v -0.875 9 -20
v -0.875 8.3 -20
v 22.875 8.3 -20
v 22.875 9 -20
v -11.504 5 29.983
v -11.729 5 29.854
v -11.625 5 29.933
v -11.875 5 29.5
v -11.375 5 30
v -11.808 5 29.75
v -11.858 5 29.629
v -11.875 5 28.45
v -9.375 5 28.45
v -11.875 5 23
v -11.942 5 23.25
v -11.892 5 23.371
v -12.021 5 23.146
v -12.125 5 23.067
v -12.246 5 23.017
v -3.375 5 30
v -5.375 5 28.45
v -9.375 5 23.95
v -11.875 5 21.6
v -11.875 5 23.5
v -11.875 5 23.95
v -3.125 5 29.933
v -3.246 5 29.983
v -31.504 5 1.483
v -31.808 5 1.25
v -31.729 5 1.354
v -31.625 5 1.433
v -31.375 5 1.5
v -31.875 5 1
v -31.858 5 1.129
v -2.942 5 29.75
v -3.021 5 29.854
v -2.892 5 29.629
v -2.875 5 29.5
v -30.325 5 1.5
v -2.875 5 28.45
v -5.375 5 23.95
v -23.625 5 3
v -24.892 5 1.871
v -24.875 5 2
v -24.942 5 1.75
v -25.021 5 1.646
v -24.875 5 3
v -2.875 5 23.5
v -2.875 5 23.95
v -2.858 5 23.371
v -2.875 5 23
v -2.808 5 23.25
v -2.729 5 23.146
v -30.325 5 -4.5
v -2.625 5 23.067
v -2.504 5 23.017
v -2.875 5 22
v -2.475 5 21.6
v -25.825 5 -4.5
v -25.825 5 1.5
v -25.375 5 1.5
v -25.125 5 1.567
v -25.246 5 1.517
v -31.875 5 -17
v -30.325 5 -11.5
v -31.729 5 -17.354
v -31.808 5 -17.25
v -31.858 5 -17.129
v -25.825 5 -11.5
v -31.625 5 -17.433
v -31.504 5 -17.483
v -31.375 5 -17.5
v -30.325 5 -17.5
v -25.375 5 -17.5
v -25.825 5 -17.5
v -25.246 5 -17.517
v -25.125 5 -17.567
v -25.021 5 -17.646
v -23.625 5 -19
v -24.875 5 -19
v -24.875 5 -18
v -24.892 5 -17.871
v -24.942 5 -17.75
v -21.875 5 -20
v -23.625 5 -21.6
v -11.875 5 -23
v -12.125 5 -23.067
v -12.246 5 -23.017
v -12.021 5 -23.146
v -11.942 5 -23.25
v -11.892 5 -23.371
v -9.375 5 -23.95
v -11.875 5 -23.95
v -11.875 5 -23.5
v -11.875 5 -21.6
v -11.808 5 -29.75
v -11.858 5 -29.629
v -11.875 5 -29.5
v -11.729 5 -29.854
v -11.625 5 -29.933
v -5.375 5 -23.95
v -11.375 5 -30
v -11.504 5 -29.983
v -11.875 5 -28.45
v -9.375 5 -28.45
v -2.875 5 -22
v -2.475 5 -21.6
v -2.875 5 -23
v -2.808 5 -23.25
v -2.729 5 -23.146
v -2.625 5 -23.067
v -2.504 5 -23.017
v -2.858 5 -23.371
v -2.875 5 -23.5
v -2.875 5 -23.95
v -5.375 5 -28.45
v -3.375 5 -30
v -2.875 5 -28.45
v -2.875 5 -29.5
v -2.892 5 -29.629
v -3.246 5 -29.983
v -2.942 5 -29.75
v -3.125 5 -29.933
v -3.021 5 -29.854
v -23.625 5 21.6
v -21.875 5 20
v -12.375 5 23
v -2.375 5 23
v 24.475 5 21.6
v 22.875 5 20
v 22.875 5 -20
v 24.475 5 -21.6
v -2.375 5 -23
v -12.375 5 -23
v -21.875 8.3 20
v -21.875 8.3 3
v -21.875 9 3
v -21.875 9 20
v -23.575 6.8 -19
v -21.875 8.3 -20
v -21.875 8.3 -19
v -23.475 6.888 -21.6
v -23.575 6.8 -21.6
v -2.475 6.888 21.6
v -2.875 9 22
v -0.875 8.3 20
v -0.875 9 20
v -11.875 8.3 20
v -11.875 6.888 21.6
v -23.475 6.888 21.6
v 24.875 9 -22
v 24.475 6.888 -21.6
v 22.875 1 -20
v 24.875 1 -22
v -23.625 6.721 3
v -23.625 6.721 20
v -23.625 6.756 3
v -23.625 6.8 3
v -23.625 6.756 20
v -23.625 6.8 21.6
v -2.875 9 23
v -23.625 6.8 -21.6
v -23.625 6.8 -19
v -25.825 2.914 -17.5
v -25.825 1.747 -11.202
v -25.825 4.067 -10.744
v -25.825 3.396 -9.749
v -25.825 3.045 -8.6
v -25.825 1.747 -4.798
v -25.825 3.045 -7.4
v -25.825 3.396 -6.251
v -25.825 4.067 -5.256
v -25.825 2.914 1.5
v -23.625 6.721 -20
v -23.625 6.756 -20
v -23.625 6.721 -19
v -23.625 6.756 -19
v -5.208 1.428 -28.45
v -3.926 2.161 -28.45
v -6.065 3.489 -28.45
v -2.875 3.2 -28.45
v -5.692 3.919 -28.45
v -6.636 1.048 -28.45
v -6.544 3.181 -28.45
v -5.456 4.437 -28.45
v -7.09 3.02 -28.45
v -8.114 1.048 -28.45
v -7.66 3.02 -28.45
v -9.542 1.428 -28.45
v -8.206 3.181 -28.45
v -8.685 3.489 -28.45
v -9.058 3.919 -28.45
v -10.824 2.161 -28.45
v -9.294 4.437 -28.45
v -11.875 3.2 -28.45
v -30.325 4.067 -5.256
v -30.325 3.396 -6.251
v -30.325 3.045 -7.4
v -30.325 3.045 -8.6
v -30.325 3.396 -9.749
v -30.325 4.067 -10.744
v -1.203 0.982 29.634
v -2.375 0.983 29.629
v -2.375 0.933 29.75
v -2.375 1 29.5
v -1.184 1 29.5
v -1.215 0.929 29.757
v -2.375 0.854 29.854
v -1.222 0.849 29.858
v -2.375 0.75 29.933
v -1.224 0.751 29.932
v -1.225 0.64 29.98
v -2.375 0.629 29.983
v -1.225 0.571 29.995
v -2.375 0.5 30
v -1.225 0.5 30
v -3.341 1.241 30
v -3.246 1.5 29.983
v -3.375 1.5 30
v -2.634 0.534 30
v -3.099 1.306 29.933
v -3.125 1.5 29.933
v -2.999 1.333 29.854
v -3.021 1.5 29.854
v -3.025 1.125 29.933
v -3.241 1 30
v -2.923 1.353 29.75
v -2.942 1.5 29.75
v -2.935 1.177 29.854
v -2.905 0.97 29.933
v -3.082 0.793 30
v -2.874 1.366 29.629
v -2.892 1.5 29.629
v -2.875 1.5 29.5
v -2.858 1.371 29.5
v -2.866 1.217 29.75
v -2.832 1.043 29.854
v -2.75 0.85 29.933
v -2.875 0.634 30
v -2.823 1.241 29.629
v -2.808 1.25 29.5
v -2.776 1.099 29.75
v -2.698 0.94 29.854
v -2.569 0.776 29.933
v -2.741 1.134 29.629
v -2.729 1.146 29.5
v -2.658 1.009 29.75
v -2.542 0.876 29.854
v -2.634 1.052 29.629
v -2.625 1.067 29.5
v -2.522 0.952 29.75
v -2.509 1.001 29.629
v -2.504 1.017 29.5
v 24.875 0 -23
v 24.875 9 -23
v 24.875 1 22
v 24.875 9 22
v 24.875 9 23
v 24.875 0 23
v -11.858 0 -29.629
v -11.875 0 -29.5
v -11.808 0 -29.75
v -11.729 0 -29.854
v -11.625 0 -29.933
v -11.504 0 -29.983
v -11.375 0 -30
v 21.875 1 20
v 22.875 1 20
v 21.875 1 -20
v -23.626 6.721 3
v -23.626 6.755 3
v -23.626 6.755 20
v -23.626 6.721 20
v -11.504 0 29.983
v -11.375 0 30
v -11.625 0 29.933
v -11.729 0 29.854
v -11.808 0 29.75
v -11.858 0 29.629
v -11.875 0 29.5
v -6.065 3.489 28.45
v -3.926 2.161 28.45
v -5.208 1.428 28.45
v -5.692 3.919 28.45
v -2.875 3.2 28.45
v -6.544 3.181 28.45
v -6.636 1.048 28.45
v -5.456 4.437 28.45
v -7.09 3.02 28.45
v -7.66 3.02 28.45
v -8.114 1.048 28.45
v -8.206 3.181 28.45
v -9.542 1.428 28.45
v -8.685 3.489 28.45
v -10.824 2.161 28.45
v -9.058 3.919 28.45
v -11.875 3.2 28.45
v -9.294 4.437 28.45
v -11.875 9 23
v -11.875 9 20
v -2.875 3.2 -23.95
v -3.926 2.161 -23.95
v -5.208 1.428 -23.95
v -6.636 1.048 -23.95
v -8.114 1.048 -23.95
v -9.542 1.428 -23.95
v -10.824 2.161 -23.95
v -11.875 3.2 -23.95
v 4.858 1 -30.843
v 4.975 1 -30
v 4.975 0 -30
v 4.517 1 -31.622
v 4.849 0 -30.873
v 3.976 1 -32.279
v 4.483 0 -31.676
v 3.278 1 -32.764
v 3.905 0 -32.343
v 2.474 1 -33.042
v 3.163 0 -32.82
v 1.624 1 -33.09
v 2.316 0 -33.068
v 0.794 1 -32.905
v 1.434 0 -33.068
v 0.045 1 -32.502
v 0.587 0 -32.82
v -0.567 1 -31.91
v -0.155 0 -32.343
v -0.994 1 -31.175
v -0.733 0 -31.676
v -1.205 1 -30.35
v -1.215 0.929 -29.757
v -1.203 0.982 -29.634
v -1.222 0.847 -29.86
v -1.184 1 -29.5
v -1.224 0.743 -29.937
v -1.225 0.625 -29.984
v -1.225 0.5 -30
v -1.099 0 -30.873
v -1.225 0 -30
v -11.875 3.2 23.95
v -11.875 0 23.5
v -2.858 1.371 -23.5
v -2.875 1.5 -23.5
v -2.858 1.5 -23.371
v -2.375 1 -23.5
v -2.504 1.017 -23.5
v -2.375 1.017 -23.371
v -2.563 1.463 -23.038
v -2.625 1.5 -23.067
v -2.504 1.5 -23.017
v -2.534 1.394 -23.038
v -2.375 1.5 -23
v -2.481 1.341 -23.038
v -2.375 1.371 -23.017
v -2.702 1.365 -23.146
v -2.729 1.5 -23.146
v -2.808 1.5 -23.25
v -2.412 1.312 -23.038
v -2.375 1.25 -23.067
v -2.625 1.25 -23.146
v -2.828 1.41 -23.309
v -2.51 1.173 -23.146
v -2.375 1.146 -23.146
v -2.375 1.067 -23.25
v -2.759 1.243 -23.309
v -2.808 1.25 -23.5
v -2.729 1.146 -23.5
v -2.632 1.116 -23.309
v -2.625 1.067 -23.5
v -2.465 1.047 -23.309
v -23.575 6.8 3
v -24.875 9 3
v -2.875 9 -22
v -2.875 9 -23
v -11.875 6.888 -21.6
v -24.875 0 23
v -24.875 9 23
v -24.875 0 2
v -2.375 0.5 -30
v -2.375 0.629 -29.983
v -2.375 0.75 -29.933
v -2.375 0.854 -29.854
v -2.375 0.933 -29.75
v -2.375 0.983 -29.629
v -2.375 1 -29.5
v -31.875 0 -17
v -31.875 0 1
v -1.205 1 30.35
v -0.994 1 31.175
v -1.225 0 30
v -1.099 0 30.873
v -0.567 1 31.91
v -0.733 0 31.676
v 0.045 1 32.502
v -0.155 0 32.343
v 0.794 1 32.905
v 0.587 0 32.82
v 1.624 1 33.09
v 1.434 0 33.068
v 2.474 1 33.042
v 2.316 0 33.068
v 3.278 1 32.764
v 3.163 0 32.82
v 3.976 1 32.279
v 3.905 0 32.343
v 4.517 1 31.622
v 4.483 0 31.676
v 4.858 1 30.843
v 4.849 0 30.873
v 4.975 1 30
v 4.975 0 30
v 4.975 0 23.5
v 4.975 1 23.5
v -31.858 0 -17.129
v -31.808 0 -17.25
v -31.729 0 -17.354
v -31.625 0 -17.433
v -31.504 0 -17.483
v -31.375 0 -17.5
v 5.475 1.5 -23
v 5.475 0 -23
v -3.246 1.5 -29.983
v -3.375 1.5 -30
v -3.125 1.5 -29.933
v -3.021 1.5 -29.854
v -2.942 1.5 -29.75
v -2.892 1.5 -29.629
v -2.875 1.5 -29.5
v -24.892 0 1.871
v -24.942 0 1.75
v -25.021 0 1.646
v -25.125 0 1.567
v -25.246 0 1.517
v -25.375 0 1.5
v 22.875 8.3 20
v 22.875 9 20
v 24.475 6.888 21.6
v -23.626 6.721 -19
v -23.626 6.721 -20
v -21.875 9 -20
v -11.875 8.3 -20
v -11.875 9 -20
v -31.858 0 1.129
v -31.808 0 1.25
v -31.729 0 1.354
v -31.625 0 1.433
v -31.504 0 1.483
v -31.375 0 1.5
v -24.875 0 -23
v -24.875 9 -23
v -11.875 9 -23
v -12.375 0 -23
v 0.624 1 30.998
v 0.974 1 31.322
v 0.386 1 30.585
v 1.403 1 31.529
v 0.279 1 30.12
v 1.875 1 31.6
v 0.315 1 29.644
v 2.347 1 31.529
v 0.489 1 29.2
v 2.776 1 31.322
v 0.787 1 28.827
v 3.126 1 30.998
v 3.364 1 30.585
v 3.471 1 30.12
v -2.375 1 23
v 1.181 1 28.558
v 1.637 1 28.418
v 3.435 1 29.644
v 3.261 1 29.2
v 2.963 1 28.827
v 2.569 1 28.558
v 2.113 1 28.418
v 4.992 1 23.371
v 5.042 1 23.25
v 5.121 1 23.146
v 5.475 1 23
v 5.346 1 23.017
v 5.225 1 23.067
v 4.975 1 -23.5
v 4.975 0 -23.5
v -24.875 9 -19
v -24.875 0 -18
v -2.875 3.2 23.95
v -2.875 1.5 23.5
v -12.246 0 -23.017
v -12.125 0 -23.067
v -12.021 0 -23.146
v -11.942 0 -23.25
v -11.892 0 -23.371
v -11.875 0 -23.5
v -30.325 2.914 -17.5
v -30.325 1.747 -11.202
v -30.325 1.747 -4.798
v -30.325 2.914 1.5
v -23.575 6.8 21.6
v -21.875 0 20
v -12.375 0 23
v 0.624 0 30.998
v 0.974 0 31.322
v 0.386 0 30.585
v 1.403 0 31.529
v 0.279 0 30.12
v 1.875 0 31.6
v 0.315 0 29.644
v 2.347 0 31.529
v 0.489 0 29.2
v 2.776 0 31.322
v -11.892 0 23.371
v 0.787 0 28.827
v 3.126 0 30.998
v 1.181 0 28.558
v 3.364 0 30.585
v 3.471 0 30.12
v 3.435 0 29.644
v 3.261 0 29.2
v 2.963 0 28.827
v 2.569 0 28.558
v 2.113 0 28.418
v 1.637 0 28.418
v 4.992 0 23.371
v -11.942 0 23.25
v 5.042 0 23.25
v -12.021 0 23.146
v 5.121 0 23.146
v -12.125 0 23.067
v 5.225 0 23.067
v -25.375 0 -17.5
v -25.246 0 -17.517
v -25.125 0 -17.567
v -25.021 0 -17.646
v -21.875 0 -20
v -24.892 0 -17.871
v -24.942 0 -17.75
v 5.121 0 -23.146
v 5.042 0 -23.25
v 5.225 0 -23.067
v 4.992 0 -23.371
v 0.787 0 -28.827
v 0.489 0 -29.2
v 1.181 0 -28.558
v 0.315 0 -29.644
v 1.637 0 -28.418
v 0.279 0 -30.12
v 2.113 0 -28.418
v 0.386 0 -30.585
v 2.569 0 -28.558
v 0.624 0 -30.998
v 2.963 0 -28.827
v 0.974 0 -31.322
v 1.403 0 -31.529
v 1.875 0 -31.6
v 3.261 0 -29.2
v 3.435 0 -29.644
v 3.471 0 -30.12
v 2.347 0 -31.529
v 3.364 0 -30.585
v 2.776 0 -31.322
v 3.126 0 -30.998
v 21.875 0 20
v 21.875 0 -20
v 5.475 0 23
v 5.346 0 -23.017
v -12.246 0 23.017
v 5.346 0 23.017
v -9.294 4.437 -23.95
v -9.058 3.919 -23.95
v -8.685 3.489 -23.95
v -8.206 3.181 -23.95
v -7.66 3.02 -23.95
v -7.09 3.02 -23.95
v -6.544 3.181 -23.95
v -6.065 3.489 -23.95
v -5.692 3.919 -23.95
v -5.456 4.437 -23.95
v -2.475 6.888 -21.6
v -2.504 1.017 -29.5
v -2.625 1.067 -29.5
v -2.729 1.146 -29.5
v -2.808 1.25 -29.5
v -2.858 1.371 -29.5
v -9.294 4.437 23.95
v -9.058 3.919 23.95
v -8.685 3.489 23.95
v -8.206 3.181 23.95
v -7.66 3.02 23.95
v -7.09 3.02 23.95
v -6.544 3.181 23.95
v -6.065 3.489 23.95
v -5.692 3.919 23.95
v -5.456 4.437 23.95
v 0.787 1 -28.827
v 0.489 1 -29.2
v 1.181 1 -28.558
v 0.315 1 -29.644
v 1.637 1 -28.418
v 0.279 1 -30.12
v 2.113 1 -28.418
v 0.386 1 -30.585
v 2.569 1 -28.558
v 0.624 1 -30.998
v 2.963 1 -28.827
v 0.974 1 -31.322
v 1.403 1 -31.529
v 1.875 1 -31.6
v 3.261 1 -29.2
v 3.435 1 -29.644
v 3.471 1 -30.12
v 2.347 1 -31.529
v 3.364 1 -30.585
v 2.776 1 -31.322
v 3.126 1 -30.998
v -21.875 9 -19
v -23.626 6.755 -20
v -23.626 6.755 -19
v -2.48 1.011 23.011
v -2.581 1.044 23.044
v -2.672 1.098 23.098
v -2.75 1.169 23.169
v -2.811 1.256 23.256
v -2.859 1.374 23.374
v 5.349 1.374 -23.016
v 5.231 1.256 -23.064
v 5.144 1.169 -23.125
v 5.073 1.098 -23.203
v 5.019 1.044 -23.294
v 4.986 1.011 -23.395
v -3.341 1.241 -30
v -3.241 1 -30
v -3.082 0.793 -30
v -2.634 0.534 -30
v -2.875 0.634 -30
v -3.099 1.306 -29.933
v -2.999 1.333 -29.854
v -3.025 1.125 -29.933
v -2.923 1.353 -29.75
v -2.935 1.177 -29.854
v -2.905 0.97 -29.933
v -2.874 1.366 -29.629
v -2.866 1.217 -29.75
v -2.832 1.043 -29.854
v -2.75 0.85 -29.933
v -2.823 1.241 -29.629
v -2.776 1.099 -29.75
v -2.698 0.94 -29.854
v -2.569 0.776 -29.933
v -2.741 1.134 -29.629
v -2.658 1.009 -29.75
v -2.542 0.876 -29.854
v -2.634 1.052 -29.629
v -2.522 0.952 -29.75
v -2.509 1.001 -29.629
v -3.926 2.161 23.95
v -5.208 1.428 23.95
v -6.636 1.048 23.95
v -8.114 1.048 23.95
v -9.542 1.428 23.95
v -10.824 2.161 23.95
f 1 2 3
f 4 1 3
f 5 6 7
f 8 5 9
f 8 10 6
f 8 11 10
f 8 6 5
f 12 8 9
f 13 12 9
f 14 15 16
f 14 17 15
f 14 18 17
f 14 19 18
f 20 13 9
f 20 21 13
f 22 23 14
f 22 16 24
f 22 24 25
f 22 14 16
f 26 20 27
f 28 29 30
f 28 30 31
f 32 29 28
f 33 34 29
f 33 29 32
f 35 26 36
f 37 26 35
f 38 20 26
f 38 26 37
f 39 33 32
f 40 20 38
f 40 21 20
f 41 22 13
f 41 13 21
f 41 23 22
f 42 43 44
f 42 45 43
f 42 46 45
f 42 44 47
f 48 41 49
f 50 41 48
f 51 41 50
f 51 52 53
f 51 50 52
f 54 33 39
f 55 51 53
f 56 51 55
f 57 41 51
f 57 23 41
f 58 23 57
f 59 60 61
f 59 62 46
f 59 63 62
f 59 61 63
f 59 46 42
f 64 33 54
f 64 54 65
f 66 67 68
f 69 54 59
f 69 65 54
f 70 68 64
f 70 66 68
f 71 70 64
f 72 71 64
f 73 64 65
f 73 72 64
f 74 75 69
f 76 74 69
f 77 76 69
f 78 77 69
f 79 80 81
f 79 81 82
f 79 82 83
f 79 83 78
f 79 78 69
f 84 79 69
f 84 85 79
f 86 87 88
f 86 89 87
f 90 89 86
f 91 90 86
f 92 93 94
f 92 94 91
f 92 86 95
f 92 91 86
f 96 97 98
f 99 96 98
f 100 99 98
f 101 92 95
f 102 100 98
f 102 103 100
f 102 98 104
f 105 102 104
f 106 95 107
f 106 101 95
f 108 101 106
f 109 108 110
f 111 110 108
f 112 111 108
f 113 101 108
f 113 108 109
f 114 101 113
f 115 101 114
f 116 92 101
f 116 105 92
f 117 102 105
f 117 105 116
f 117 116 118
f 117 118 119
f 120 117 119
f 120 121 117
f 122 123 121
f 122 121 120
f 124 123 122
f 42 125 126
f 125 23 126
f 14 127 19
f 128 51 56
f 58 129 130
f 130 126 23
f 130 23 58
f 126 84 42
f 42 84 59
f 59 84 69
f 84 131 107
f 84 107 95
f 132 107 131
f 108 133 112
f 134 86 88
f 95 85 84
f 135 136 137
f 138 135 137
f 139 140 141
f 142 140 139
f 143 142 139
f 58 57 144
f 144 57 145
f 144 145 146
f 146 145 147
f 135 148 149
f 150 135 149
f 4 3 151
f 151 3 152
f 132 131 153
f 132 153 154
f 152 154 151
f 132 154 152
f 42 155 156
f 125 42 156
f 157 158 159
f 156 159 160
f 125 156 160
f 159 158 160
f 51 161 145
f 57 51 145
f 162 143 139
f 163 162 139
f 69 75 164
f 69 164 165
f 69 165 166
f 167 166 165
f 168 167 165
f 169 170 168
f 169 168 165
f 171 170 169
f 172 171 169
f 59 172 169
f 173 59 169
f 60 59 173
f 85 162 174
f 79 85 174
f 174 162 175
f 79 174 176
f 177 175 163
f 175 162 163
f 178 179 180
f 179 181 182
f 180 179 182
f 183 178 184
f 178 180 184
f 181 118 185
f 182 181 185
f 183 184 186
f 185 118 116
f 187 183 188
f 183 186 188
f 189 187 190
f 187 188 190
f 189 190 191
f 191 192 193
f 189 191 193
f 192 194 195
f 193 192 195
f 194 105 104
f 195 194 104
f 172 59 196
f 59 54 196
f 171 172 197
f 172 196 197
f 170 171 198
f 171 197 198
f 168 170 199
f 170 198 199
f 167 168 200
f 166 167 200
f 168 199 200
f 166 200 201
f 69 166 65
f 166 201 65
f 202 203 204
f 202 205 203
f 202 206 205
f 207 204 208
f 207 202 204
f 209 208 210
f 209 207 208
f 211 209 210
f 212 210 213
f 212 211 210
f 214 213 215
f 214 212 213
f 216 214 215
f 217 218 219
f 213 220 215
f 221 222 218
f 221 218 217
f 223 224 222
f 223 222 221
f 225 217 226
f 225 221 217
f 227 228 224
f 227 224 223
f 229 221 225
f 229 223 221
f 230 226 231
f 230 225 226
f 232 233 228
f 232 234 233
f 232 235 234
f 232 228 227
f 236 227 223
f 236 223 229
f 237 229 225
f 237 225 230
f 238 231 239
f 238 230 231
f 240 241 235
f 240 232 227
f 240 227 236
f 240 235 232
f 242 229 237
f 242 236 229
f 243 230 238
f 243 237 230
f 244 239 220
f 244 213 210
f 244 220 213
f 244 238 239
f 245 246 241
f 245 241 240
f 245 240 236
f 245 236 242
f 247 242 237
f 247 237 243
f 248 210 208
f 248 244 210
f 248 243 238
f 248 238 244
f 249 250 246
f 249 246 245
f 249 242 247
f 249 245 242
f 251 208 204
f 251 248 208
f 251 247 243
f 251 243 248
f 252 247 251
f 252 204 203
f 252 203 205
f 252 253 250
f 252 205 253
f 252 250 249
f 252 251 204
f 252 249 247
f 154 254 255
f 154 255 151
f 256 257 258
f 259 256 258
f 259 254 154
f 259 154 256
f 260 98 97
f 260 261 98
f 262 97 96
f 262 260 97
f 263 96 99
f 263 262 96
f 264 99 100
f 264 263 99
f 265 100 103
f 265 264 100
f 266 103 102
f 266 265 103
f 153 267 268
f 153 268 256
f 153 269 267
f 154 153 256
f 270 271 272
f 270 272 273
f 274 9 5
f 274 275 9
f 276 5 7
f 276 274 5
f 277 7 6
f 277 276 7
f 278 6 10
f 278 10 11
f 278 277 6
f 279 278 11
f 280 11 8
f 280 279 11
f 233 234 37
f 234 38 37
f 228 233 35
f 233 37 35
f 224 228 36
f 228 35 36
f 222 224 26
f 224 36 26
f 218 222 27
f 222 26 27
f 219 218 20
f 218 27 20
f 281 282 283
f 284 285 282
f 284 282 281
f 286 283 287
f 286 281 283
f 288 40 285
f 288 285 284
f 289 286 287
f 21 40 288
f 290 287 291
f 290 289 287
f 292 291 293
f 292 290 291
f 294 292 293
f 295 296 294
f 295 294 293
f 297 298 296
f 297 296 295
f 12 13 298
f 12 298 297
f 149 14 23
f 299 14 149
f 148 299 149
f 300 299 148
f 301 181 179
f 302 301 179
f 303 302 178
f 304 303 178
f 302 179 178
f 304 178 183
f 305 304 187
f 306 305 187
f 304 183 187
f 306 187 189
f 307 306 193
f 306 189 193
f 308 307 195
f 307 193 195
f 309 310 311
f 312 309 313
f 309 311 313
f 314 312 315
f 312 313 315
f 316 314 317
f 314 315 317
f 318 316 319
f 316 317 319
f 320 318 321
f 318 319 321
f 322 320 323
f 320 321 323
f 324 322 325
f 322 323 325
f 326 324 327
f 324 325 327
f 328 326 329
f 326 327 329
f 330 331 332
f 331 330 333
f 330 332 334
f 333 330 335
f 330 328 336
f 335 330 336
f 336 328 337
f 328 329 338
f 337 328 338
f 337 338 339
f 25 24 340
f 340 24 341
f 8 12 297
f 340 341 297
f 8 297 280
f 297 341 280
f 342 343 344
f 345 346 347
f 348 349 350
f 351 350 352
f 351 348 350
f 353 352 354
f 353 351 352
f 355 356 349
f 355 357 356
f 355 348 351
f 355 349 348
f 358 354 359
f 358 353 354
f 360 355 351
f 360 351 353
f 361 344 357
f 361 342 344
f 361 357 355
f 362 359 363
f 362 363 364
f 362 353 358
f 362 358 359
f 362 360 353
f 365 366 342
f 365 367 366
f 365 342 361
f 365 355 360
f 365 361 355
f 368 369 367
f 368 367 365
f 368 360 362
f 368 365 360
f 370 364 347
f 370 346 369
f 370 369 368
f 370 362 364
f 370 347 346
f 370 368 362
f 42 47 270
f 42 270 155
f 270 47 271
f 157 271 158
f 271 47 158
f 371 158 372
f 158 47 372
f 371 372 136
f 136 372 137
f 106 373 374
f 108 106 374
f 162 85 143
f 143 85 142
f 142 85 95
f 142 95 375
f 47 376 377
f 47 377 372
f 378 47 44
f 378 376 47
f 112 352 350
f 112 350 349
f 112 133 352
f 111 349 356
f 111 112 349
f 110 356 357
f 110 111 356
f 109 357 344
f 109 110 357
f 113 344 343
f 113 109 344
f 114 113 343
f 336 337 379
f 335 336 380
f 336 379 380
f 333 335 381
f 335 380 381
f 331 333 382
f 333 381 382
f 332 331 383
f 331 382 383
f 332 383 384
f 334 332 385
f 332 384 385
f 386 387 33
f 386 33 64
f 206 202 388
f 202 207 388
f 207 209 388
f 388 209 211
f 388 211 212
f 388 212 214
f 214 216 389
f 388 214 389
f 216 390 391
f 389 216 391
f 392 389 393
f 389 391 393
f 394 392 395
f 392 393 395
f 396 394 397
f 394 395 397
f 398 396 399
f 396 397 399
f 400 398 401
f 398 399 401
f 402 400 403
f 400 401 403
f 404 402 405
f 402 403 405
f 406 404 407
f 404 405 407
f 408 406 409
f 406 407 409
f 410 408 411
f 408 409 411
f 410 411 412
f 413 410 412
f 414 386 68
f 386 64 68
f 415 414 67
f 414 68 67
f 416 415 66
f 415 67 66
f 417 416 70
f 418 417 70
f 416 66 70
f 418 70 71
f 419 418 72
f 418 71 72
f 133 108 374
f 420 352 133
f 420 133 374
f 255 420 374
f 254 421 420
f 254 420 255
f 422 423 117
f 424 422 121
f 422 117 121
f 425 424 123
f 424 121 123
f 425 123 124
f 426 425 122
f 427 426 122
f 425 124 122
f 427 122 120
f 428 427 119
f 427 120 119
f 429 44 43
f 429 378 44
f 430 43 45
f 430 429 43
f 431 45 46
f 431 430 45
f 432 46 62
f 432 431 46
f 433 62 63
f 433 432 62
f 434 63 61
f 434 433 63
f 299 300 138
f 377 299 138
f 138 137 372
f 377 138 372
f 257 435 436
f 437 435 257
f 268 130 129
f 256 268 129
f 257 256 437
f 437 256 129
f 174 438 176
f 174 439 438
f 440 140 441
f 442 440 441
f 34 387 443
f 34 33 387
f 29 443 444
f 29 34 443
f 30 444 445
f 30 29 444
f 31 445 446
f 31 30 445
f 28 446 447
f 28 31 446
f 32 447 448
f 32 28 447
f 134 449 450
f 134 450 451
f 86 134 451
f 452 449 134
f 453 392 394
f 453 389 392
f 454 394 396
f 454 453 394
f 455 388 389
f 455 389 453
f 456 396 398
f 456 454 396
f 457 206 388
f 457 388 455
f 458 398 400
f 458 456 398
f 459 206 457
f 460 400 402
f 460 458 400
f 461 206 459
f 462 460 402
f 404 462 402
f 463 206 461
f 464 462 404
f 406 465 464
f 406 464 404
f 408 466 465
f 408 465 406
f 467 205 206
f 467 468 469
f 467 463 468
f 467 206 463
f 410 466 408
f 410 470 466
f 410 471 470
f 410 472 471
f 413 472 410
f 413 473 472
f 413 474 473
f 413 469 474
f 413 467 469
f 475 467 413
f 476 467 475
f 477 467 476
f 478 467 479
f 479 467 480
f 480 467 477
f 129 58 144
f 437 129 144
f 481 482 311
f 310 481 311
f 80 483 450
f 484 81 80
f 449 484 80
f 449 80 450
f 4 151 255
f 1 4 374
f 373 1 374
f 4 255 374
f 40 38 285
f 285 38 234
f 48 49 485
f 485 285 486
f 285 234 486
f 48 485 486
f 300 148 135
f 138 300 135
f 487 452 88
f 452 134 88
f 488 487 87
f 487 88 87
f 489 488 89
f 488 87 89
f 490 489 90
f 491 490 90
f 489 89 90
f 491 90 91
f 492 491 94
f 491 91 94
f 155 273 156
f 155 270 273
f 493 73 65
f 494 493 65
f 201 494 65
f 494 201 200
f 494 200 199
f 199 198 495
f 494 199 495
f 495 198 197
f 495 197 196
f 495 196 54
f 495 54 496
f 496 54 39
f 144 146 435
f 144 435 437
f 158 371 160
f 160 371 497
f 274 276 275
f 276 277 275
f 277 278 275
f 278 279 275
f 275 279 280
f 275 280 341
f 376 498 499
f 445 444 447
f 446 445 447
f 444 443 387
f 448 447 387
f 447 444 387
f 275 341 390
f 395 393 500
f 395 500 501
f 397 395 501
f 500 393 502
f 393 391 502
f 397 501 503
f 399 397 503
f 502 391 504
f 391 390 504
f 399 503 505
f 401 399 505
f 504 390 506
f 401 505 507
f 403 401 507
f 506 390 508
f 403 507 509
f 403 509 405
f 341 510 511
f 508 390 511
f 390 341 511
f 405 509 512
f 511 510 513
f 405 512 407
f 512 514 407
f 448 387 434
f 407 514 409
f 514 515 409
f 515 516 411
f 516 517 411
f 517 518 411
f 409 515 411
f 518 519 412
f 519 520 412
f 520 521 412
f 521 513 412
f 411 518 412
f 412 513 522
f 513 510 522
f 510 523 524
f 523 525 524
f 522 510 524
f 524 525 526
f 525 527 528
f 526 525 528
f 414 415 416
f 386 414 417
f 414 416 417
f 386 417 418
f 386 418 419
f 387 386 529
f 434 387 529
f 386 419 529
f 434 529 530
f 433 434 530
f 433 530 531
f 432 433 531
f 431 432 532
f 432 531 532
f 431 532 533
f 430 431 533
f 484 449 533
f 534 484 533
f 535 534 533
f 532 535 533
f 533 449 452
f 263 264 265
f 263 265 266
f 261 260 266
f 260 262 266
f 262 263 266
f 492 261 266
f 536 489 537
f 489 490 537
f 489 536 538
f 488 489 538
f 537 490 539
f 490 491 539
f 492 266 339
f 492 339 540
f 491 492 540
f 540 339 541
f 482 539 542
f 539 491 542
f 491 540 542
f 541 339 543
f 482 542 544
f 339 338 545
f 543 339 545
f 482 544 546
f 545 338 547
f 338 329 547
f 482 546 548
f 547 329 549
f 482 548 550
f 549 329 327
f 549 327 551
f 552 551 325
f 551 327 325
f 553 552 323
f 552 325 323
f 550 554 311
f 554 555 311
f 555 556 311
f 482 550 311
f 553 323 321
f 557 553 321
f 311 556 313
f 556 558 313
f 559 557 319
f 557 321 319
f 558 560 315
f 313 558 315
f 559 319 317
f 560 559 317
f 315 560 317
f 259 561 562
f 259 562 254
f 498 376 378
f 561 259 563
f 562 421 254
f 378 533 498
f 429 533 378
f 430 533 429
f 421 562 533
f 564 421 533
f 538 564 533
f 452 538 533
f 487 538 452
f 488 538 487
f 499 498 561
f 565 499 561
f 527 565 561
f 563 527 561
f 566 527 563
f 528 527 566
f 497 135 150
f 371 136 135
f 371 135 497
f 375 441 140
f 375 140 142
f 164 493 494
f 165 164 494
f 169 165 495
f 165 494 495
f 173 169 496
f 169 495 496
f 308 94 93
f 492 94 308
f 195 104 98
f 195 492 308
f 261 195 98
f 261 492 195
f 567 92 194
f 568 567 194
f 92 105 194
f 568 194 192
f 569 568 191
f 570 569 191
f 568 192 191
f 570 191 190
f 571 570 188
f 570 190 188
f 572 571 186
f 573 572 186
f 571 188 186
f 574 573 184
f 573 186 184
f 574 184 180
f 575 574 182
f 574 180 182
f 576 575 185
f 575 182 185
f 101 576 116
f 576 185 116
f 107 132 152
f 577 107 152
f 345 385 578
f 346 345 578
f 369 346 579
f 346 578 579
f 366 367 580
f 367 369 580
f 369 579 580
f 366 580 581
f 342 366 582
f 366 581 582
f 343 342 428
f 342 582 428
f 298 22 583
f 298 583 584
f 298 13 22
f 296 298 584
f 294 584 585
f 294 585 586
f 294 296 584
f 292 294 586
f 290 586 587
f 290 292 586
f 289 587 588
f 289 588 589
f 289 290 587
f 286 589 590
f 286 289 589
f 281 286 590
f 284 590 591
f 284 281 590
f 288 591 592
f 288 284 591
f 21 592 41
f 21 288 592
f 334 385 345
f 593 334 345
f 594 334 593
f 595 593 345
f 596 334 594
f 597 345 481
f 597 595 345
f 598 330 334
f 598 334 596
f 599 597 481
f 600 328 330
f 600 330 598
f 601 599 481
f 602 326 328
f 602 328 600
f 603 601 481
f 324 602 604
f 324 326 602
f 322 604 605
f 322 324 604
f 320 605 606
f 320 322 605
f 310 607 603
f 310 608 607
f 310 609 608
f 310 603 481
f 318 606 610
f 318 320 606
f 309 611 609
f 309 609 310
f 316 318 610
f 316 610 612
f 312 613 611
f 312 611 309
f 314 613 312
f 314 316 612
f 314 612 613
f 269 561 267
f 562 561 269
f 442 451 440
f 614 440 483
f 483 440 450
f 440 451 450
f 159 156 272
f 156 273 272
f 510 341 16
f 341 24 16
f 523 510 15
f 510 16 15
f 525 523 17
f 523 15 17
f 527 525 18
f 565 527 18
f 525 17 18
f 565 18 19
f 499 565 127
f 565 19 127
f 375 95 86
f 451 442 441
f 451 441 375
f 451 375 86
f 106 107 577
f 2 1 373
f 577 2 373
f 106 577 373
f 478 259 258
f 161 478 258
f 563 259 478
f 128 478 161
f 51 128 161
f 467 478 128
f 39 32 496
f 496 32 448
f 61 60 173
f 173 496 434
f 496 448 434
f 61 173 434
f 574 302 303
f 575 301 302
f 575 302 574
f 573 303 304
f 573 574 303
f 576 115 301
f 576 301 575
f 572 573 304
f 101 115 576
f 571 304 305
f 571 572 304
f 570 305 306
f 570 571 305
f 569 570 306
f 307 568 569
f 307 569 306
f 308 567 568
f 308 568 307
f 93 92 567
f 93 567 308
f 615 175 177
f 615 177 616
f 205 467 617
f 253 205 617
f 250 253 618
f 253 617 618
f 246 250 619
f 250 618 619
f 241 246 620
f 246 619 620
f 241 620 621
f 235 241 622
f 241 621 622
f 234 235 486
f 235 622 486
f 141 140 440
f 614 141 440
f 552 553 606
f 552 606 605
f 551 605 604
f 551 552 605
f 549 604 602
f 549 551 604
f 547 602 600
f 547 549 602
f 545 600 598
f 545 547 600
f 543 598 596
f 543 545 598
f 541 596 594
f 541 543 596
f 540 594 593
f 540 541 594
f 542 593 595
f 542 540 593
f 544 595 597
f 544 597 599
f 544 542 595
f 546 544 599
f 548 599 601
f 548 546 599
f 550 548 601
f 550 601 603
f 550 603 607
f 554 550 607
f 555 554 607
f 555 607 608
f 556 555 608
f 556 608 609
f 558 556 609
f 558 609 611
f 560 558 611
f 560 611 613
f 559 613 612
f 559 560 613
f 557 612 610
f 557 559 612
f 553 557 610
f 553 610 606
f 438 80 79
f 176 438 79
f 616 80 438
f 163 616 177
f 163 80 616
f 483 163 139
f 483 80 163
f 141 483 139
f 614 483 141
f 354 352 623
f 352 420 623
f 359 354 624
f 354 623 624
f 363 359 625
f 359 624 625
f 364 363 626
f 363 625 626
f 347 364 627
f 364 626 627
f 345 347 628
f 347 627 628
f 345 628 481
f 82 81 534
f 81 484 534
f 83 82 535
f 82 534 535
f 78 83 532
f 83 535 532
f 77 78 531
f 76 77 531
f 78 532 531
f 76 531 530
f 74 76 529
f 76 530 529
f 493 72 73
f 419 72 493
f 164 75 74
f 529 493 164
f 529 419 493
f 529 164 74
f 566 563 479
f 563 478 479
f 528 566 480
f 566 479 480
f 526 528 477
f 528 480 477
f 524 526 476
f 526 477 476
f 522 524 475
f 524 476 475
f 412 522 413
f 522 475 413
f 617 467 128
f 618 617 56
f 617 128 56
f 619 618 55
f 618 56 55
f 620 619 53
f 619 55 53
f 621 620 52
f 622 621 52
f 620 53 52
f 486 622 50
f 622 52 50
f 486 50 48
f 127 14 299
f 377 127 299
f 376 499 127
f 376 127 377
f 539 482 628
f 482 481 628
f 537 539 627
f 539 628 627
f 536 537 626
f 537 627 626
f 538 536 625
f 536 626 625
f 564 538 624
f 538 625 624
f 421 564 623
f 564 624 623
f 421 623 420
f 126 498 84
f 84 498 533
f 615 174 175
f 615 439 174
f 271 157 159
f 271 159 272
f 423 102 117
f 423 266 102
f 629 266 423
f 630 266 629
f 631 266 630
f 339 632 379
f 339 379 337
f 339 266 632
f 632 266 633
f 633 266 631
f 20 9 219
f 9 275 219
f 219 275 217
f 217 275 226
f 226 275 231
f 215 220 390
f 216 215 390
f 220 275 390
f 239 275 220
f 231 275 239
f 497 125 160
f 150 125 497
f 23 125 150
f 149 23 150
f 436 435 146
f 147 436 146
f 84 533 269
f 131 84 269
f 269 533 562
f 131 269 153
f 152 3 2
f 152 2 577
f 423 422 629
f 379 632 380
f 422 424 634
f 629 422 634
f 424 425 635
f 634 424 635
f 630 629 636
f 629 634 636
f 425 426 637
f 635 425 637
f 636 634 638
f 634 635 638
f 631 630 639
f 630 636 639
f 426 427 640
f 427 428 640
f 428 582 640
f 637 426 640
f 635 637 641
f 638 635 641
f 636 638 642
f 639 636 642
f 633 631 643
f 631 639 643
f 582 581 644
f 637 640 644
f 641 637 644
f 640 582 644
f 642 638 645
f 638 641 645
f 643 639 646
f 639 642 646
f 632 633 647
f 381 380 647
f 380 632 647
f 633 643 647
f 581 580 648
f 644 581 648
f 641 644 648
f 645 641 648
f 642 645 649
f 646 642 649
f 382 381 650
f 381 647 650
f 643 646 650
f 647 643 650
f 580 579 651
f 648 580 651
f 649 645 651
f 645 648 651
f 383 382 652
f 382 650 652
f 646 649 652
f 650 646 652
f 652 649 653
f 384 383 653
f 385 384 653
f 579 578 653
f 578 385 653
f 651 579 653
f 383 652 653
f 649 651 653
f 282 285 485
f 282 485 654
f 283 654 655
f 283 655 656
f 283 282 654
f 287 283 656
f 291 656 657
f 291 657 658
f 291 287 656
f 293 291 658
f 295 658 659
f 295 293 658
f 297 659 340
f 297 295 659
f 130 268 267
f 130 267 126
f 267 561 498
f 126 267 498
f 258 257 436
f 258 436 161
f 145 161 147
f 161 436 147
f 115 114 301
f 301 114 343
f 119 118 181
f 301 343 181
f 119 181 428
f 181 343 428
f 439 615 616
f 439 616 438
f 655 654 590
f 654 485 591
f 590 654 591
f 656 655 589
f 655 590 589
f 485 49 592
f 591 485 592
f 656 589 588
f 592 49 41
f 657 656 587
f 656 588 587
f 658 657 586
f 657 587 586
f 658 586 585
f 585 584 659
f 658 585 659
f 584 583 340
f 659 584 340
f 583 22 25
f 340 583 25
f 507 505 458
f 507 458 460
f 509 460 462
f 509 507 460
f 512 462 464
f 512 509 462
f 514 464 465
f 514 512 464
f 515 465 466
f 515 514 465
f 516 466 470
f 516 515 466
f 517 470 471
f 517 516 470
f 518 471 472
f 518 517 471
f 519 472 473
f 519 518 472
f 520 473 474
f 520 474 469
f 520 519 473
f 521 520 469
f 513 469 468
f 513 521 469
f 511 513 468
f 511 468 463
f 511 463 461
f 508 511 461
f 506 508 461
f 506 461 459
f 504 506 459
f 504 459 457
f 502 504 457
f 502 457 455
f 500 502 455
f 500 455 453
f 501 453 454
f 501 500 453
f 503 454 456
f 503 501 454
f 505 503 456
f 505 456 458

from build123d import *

# Parameters (mm, degrees)
CROQUIS1_R              = 1.6
CROQUIS1_W              = 43.75
CROQUIS1_H              = 40
SALIENTE_EXTRUIR1_DEPTH = 1
SALIENTE_EXTRUIR2_DEPTH = 8
CROQUIS3_W              = 43.2
CROQUIS3_H              = 1.8
CORTAR_EXTRUIR1_DEPTH   = 48.5
CROQUIS4_W              = 9
CROQUIS4_H              = 3
CORTAR_EXTRUIR3_DEPTH   = 4
CHAFL_N2_SIZE           = 2
CROQUIS5_W              = 9
CROQUIS5_H              = 7
SALIENTE_EXTRUIR3_DEPTH = 4
CORTAR_EXTRUIR7_DEPTH   = 2.25
CROQUIS9_W              = 10
CROQUIS9_H              = 19
SALIENTE_EXTRUIR4_DEPTH = 5
CROQUIS10_W             = 3
CROQUIS10_H             = 22
CORTAR_EXTRUIR5_DEPTH   = 4
REDONDEO2_R             = 0.5
CORTAR_EXTRUIR8_DEPTH   = 2.25


with BuildPart() as part:
    # Croquis1 → Saliente-Extruir1 (new body)
    with BuildSketch(Plane(origin=(0, 0, 0), x_dir=(1, 0, 0), z_dir=(0, 1, 0))):
        with BuildLine():
            Line((4.975, -30), (4.975, -23))
            Line((4.975, -23), (24.875, -23))
            Line((24.875, -23), (24.875, 23))
            Line((24.875, 23), (4.975, 23))
            Line((4.975, 23), (4.975, 30))
            ThreePointArc((4.975, 30), (1.875, 33.1), (-1.225, 30))
            Line((-1.225, 30), (-11.875, 30))
            Line((-11.875, 30), (-11.875, 23))
            Line((-11.875, 23), (-24.875, 23))
            Line((-24.875, 23), (-24.875, -23))
            Line((-24.875, -23), (-11.875, -23))
            Line((-11.875, -23), (-11.875, -30))
            Line((-11.875, -30), (-1.225, -30))
            ThreePointArc((-1.225, -30), (1.875, -33.1), (4.975, -30))
        make_face()
        with Locations(Location((1.875, -30, 0), (0, 0, 270))):
            Circle(CROQUIS1_R, mode=Mode.SUBTRACT)
        with Locations(Location((1.875, 30, 0), (0, 0, 90))):
            Circle(CROQUIS1_R, mode=Mode.SUBTRACT)
        Rectangle(CROQUIS1_W, CROQUIS1_H, mode=Mode.SUBTRACT)
    extrude(amount=SALIENTE_EXTRUIR1_DEPTH)

    # Croquis2 → Saliente-Extruir2 (add)
    with BuildSketch(Plane(origin=(0, 1, 0), x_dir=(1, 0, 0), z_dir=(0, 1, 0))):
        Polygon((21.875, -20), (24.875, -20), (24.875, -23), (-24.875, -23), (-24.875, 23), (24.875, 23), (24.875, 20), (21.875, 20), (-21.875, 20), (-21.875, -20), align=None)
    extrude(amount=SALIENTE_EXTRUIR2_DEPTH)

    # Croquis3 → Cortar-Extruir1 (cut)
    with BuildSketch(Plane.ZY.offset(-24.875)):
        with Locations((0, 5.9)):
            Rectangle(CROQUIS3_W, CROQUIS3_H)
    extrude(amount=CORTAR_EXTRUIR1_DEPTH, mode=Mode.SUBTRACT)

    # Chaflán1
    # the kernel refuses this chamfer: 1.7, 1.5 mm, written as the material it takes off along each edge
    with BuildSketch(Plane(origin=(24.875, 6.8, -20), x_dir=(0, 0.9994558527200353, 0.03298482171646588), z_dir=(-1, 0, 0))) as chafl_n1_piece_1_section:
        with BuildLine():
            Line((1.545831431, 0), (-0.102721849, 1.748552182))
            Line((-0.102721849, 1.748552182), (-0.136703348, 1.747430698))
            ThreePointArc((-0.136703348, 1.747430698), (-0.062859529, 0.873896605), (-0.033981499, -0.001121484))
            Line((-0.033981499, -0.001121484), (0.001121484, -0.033981499))
            ThreePointArc((0.001121484, -0.033981499), (0.773196268, -0.008500885), (1.546952915, -0.033981499))
            Line((1.546952915, -0.033981499), (1.545831431, 0))
        make_face()
    chafl_n1_piece_1 = extrude(amount=46.75, mode=Mode.PRIVATE)
    chafl_n1_piece_1 = split(chafl_n1_piece_1, bisect_by=Plane(origin=(1.5, 7.297528396, -21.6), z_dir=(0, 0, 1)), keep=Keep.TOP, mode=Mode.PRIVATE)
    add(chafl_n1_piece_1, mode=Mode.SUBTRACT)
    with BuildSketch(Plane(origin=(-21.875, 6.8, 20), x_dir=(0, 0.9994558527200353, -0.03298482171646588), z_dir=(1, 0, 0))) as chafl_n1_piece_2_section:
        with BuildLine():
            Line((1.545831431, 0), (-0.102721849, 1.748552182))
            Line((-0.102721849, 1.748552182), (-0.136703348, 1.747430698))
            ThreePointArc((-0.136703348, 1.747430698), (-0.062859529, 0.873896605), (-0.033981499, -0.001121484))
            Line((-0.033981499, -0.001121484), (0.001121484, -0.033981499))
            ThreePointArc((0.001121484, -0.033981499), (0.773196268, -0.008500885), (1.546952915, -0.033981499))
            Line((1.546952915, -0.033981499), (1.545831431, 0))
        make_face()
    chafl_n1_piece_2 = extrude(amount=46.75, mode=Mode.PRIVATE)
    chafl_n1_piece_2 = split(chafl_n1_piece_2, bisect_by=Plane(origin=(1.5, 7.297528396, 21.6), z_dir=(0, 0, -1)), keep=Keep.TOP, mode=Mode.PRIVATE)
    add(chafl_n1_piece_2, mode=Mode.SUBTRACT)
    with BuildSketch(Plane(origin=(-21.875, 6.8, -20), x_dir=(0.03298482171646358, 0.9994558527200355, 0), z_dir=(0, 0, 1))) as chafl_n1_piece_3:
        with BuildLine():
            Line((1.545831431, 0), (-0.102721849, 1.748552182))
            Line((-0.102721849, 1.748552182), (-0.136703348, 1.747430698))
            ThreePointArc((-0.136703348, 1.747430698), (-0.062859529, 0.873896605), (-0.033981499, -0.001121484))
            Line((-0.033981499, -0.001121484), (0.001121484, -0.033981499))
            ThreePointArc((0.001121484, -0.033981499), (0.773196268, -0.008500885), (1.546952915, -0.033981499))
            Line((1.546952915, -0.033981499), (1.545831431, 0))
        make_face()
    extrude(amount=40, mode=Mode.SUBTRACT)
    with BuildSketch(Plane(origin=(24.875, 6.8, -20), x_dir=(0, 0.9994558527200353, 0.03298482171646588), z_dir=(-1, 0, 0))) as chafl_n1_piece_4a_section:
        with BuildLine():
            Line((1.545831431, 0), (-0.102721849, 1.748552182))
            Line((-0.102721849, 1.748552182), (-0.136703348, 1.747430698))
            ThreePointArc((-0.136703348, 1.747430698), (-0.062859529, 0.873896605), (-0.033981499, -0.001121484))
            Line((-0.033981499, -0.001121484), (0.001121484, -0.033981499))
            ThreePointArc((0.001121484, -0.033981499), (0.773196268, -0.008500885), (1.546952915, -0.033981499))
            Line((1.546952915, -0.033981499), (1.545831431, 0))
        make_face()
    chafl_n1_piece_4a = extrude(amount=51.128917184, mode=Mode.PRIVATE)
    chafl_n1_piece_4a = split(chafl_n1_piece_4a, bisect_by=Plane(origin=(-21.875, 7.297528396, -20.551236264), z_dir=(-1, 0, 0)), keep=Keep.TOP, mode=Mode.PRIVATE)
    chafl_n1_piece_4a = split(chafl_n1_piece_4a, bisect_by=Plane(origin=(-23.625, 7.297528396, -20.551236264), z_dir=(1, 0, 0)), keep=Keep.TOP, mode=Mode.PRIVATE)
    chafl_n1_piece_4a = split(chafl_n1_piece_4a, bisect_by=Plane(origin=(-22.75, 7.297528396, -21.6), z_dir=(0, 0, 1)), keep=Keep.TOP, mode=Mode.PRIVATE)
    with BuildSketch(Plane(origin=(-21.875, 6.8, -24.378917184), x_dir=(0.03298482171646588, 0.9994558527200353, 0), z_dir=(0, 0, 1))) as chafl_n1_piece_4b_section:
        with BuildLine():
            Line((1.545831431, 0), (-0.102721849, 1.748552182))
            Line((-0.102721849, 1.748552182), (-0.136703348, 1.747430698))
            ThreePointArc((-0.136703348, 1.747430698), (-0.062859529, 0.873896605), (-0.033981499, -0.001121484))
            Line((-0.033981499, -0.001121484), (0.001121484, -0.033981499))
            ThreePointArc((0.001121484, -0.033981499), (0.773196268, -0.008500885), (1.546952915, -0.033981499))
            Line((1.546952915, -0.033981499), (1.545831431, 0))
        make_face()
    chafl_n1_piece_4b = extrude(amount=44.378917184, mode=Mode.PRIVATE)
    chafl_n1_piece_4b = split(chafl_n1_piece_4b, bisect_by=Plane(origin=(-22.437497136, 7.292287741, -20), z_dir=(0, 0, -1)), keep=Keep.TOP, mode=Mode.PRIVATE)
    chafl_n1_piece_4b = split(chafl_n1_piece_4b, bisect_by=Plane(origin=(-22.437497136, 7.292287741, -21.6), z_dir=(0, 0, 1)), keep=Keep.TOP, mode=Mode.PRIVATE)
    chafl_n1_piece_4 = chafl_n1_piece_4a & chafl_n1_piece_4b
    add(chafl_n1_piece_4, mode=Mode.SUBTRACT)
    with BuildSketch(Plane(origin=(-21.875, 6.8, -20), x_dir=(0.03298482171646358, 0.9994558527200355, 0), z_dir=(0, 0, 1))) as chafl_n1_piece_5a_section:
        with BuildLine():
            Line((1.545831431, 0), (-0.102721849, 1.748552182))
            Line((-0.102721849, 1.748552182), (-0.136703348, 1.747430698))
            ThreePointArc((-0.136703348, 1.747430698), (-0.062859529, 0.873896605), (-0.033981499, -0.001121484))
            Line((-0.033981499, -0.001121484), (0.001121484, -0.033981499))
            ThreePointArc((0.001121484, -0.033981499), (0.773196268, -0.008500885), (1.546952915, -0.033981499))
            Line((1.546952915, -0.033981499), (1.545831431, 0))
        make_face()
    chafl_n1_piece_5a = extrude(amount=44.378917184, mode=Mode.PRIVATE)
    chafl_n1_piece_5a = split(chafl_n1_piece_5a, bisect_by=Plane(origin=(-22.437497136, 7.292287741, 20), z_dir=(0, 0, 1)), keep=Keep.TOP, mode=Mode.PRIVATE)
    chafl_n1_piece_5a = split(chafl_n1_piece_5a, bisect_by=Plane(origin=(-22.437497136, 7.292287741, 21.6), z_dir=(0, 0, -1)), keep=Keep.TOP, mode=Mode.PRIVATE)
    with BuildSketch(Plane(origin=(-26.253917184, 6.8, 20), x_dir=(0, 0.9994558527200353, -0.03298482171646588), z_dir=(1, 0, 0))) as chafl_n1_piece_5b_section:
        with BuildLine():
            Line((1.545831431, 0), (-0.102721849, 1.748552182))
            Line((-0.102721849, 1.748552182), (-0.136703348, 1.747430698))
            ThreePointArc((-0.136703348, 1.747430698), (-0.062859529, 0.873896605), (-0.033981499, -0.001121484))
            Line((-0.033981499, -0.001121484), (0.001121484, -0.033981499))
            ThreePointArc((0.001121484, -0.033981499), (0.773196268, -0.008500885), (1.546952915, -0.033981499))
            Line((1.546952915, -0.033981499), (1.545831431, 0))
        make_face()
    chafl_n1_piece_5b = extrude(amount=51.128917184, mode=Mode.PRIVATE)
    chafl_n1_piece_5b = split(chafl_n1_piece_5b, bisect_by=Plane(origin=(-21.875, 7.297528396, 20.551236264), z_dir=(-1, 0, 0)), keep=Keep.TOP, mode=Mode.PRIVATE)
    chafl_n1_piece_5b = split(chafl_n1_piece_5b, bisect_by=Plane(origin=(-22.75, 7.297528396, 21.6), z_dir=(0, 0, -1)), keep=Keep.TOP, mode=Mode.PRIVATE)
    chafl_n1_piece_5b = split(chafl_n1_piece_5b, bisect_by=Plane(origin=(-23.625, 7.297528396, 20.551236264), z_dir=(1, 0, 0)), keep=Keep.TOP, mode=Mode.PRIVATE)
    chafl_n1_piece_5 = chafl_n1_piece_5a & chafl_n1_piece_5b
    add(chafl_n1_piece_5, mode=Mode.SUBTRACT)

    # Croquis4 → Cortar-Extruir3 (cut)
    with BuildSketch(Plane(origin=(0, 9, 0), x_dir=(1, 0, 0), z_dir=(0, 1, 0))):
        with Locations((-7.375, -21.5)):
            Rectangle(CROQUIS4_W, CROQUIS4_H)
        with Locations((-7.375, 21.5)):
            Rectangle(CROQUIS4_W, CROQUIS4_H)
    extrude(amount=-CORTAR_EXTRUIR3_DEPTH, mode=Mode.SUBTRACT)

    # Chaflán2
    # the kernel refuses this chamfer: 2 mm, written as the material it takes off along each edge
    with BuildSketch(Plane(origin=(-2.875, 14.143365976, 20), x_dir=(-0.027495876610586296, 0, 0.9996219169112968), z_dir=(0, -1, 0))) as chafl_n2_piece_1_section:
        Polygon((CHAFL_N2_SIZE * 0.999621916911, -CHAFL_N2_SIZE * 0.0274958766106), (-CHAFL_N2_SIZE * 0.0274958766106, -CHAFL_N2_SIZE * 0.999621916911), (0, 0), align=None)
    chafl_n2_piece_1 = extrude(amount=10.986731952, mode=Mode.PRIVATE)
    chafl_n2_piece_1 = split(chafl_n2_piece_1, bisect_by=Plane(origin=(-2.743425682, 5, 21.736851363), z_dir=(0, 1, 0)), keep=Keep.TOP, mode=Mode.PRIVATE)
    add(chafl_n2_piece_1, mode=Mode.SUBTRACT)
    with BuildSketch(Plane(origin=(-2.875, 14.143365976, -20), x_dir=(0.9996219169112968, 0, 0.027495876610585623), z_dir=(0, -1, 0))) as chafl_n2_piece_2_section:
        Polygon((CHAFL_N2_SIZE * 0.999621916911, -CHAFL_N2_SIZE * 0.0274958766106), (-CHAFL_N2_SIZE * 0.0274958766106, -CHAFL_N2_SIZE * 0.999621916911), (0, 0), align=None)
    chafl_n2_piece_2 = extrude(amount=10.986731952, mode=Mode.PRIVATE)
    chafl_n2_piece_2 = split(chafl_n2_piece_2, bisect_by=Plane(origin=(-2.25030089, 5, -20.750601779), z_dir=(0, 1, 0)), keep=Keep.TOP, mode=Mode.PRIVATE)
    add(chafl_n2_piece_2, mode=Mode.SUBTRACT)
    with BuildSketch(Plane(origin=(24.875, 3.156634024, 20), x_dir=(-0.9996219169112968, 0, -0.027495876610585647), z_dir=(0, 1, 0))) as chafl_n2_piece_3:
        Polygon((CHAFL_N2_SIZE * 0.999621916911, CHAFL_N2_SIZE * 0.0274958766106), (-CHAFL_N2_SIZE * 0.0274958766106, CHAFL_N2_SIZE * 0.999621916911), (0, 0), align=None)
    extrude(amount=10.986731952, mode=Mode.SUBTRACT)
    with BuildSketch(Plane(origin=(24.875, 3.156634024, -20), x_dir=(-0.9996219169112968, 0, 0.027495876610585647), z_dir=(0, 1, 0))) as chafl_n2_piece_4:
        Polygon((CHAFL_N2_SIZE * 0.999621916911, -CHAFL_N2_SIZE * 0.0274958766106), (-CHAFL_N2_SIZE * 0.0274958766106, -CHAFL_N2_SIZE * 0.999621916911), (0, 0), align=None)
    extrude(amount=10.986731952, mode=Mode.SUBTRACT)
    with BuildSketch(Plane(origin=(24.875, 1, 20), x_dir=(-0.9996219169112968, 0, -0.027495876610587326), z_dir=(0, 1, 0))) as chafl_n2_piece_5:
        Polygon((CHAFL_N2_SIZE * 0.999621916911, CHAFL_N2_SIZE * 0.0274958766106), (-CHAFL_N2_SIZE * 0.0274958766106, CHAFL_N2_SIZE * 0.999621916911), (0, 0), align=None)
    extrude(amount=9.143365976, mode=Mode.SUBTRACT)
    with BuildSketch(Plane(origin=(24.875, 1, -20), x_dir=(-0.9996219169112968, 0, 0.027495876610585647), z_dir=(0, 1, 0))) as chafl_n2_piece_6:
        Polygon((CHAFL_N2_SIZE * 0.999621916911, -CHAFL_N2_SIZE * 0.0274958766106), (-CHAFL_N2_SIZE * 0.0274958766106, -CHAFL_N2_SIZE * 0.999621916911), (0, 0), align=None)
    extrude(amount=9.143365976, mode=Mode.SUBTRACT)

    # Croquis5 → Saliente-Extruir3 (add)
    with BuildSketch(Plane(origin=(0, 1, 0), x_dir=(1, 0, 0), z_dir=(0, 1, 0))):
        with Locations((-7.375, 26.5)):
            Rectangle(CROQUIS5_W, CROQUIS5_H)
        with Locations((-7.375, -26.5)):
            Rectangle(CROQUIS5_W, CROQUIS5_H)
    extrude(amount=SALIENTE_EXTRUIR3_DEPTH)

    # Croquis8 → Cortar-Extruir7 (cut, symmetric)
    with BuildSketch(Plane(origin=(0, 0, -26.2), x_dir=(-1, 0, 0), z_dir=(0, 0, -1))):
        with BuildLine():
            Line((2.875, 5), (2.875, 3.2))
            ThreePointArc((2.875, 3.2), (7.375, 1), (11.875, 3.2))
            Line((11.875, 3.2), (11.875, 5))
            Line((11.875, 5), (9.375, 5))
            ThreePointArc((9.375, 5), (7.375, 3), (5.375, 5))
            Line((5.375, 5), (2.875, 5))
        make_face()
    cortar_extruir7 = extrude(amount=CORTAR_EXTRUIR7_DEPTH, both=True, mode=Mode.SUBTRACT)

    # Simetría1: Cortar-Extruir7 across plane
    add(cortar_extruir7.mirror(Plane.XY), mode=Mode.SUBTRACT)

    # Croquis9 → Saliente-Extruir4 (add)
    with BuildSketch(Plane(origin=(0, 0, 0), x_dir=(1, 0, 0), z_dir=(0, 1, 0))):
        with Locations((-26.875, 8)):
            Rectangle(CROQUIS9_W, CROQUIS9_H)
    extrude(amount=SALIENTE_EXTRUIR4_DEPTH)

    # Croquis10 → Cortar-Extruir5 (cut)
    with BuildSketch(Plane(origin=(0, 9, 0), x_dir=(1, 0, 0), z_dir=(0, 1, 0))):
        with Locations((-23.375, 8)):
            Rectangle(CROQUIS10_W, CROQUIS10_H)
    extrude(amount=-CORTAR_EXTRUIR5_DEPTH, mode=Mode.SUBTRACT)

    # Redondeo2
    redondeo2_edges = [part.edges().sort_by_distance(p)[0] for p in [
        (-2.05, 1, -30),
        (4.975, 0.5, 23),
        (-11.875, 2.5, 30),
        (-11.875, 2.5, 23),
        (-11.875, 2.5, -23),
        (-11.875, 2.5, -30),
        (4.975, 0.5, -23),
        (-2.875, 1, -26.5),
        (-2.875, 3, -23),
        (-2.875, 3, -30),
        (-2.05, 1, 30),
        (-2.875, 1, 26.5),
        (-2.875, 3, 30),
        (-2.875, 3, 23),
        (-24.875, 2.5, 1.5),
        (-24.875, 2.5, -17.5),
        (-31.875, 2.5, 1.5),
        (-31.875, 2.5, -17.5),
        (1.05, 1, -23),
    ]]
    fillet(redondeo2_edges, radius=REDONDEO2_R)

    # Croquis11 → Cortar-Extruir8 (cut, symmetric)
    with BuildSketch(Plane.ZY.offset(28.075)):
        with BuildLine():
            Line((-17.5, 5), (-17.5, 2.913949475))
            ThreePointArc((-17.5, 2.913949475), (-8, 1.6), (1.5, 2.913949475))
            Line((1.5, 2.913949475), (1.5, 5))
            Line((1.5, 5), (-4.5, 5))
            ThreePointArc((-4.5, 5), (-8, 3), (-11.5, 5))
            Line((-11.5, 5), (-17.5, 5))
        make_face()
    extrude(amount=CORTAR_EXTRUIR8_DEPTH, both=True, mode=Mode.SUBTRACT)


solid = part.part
